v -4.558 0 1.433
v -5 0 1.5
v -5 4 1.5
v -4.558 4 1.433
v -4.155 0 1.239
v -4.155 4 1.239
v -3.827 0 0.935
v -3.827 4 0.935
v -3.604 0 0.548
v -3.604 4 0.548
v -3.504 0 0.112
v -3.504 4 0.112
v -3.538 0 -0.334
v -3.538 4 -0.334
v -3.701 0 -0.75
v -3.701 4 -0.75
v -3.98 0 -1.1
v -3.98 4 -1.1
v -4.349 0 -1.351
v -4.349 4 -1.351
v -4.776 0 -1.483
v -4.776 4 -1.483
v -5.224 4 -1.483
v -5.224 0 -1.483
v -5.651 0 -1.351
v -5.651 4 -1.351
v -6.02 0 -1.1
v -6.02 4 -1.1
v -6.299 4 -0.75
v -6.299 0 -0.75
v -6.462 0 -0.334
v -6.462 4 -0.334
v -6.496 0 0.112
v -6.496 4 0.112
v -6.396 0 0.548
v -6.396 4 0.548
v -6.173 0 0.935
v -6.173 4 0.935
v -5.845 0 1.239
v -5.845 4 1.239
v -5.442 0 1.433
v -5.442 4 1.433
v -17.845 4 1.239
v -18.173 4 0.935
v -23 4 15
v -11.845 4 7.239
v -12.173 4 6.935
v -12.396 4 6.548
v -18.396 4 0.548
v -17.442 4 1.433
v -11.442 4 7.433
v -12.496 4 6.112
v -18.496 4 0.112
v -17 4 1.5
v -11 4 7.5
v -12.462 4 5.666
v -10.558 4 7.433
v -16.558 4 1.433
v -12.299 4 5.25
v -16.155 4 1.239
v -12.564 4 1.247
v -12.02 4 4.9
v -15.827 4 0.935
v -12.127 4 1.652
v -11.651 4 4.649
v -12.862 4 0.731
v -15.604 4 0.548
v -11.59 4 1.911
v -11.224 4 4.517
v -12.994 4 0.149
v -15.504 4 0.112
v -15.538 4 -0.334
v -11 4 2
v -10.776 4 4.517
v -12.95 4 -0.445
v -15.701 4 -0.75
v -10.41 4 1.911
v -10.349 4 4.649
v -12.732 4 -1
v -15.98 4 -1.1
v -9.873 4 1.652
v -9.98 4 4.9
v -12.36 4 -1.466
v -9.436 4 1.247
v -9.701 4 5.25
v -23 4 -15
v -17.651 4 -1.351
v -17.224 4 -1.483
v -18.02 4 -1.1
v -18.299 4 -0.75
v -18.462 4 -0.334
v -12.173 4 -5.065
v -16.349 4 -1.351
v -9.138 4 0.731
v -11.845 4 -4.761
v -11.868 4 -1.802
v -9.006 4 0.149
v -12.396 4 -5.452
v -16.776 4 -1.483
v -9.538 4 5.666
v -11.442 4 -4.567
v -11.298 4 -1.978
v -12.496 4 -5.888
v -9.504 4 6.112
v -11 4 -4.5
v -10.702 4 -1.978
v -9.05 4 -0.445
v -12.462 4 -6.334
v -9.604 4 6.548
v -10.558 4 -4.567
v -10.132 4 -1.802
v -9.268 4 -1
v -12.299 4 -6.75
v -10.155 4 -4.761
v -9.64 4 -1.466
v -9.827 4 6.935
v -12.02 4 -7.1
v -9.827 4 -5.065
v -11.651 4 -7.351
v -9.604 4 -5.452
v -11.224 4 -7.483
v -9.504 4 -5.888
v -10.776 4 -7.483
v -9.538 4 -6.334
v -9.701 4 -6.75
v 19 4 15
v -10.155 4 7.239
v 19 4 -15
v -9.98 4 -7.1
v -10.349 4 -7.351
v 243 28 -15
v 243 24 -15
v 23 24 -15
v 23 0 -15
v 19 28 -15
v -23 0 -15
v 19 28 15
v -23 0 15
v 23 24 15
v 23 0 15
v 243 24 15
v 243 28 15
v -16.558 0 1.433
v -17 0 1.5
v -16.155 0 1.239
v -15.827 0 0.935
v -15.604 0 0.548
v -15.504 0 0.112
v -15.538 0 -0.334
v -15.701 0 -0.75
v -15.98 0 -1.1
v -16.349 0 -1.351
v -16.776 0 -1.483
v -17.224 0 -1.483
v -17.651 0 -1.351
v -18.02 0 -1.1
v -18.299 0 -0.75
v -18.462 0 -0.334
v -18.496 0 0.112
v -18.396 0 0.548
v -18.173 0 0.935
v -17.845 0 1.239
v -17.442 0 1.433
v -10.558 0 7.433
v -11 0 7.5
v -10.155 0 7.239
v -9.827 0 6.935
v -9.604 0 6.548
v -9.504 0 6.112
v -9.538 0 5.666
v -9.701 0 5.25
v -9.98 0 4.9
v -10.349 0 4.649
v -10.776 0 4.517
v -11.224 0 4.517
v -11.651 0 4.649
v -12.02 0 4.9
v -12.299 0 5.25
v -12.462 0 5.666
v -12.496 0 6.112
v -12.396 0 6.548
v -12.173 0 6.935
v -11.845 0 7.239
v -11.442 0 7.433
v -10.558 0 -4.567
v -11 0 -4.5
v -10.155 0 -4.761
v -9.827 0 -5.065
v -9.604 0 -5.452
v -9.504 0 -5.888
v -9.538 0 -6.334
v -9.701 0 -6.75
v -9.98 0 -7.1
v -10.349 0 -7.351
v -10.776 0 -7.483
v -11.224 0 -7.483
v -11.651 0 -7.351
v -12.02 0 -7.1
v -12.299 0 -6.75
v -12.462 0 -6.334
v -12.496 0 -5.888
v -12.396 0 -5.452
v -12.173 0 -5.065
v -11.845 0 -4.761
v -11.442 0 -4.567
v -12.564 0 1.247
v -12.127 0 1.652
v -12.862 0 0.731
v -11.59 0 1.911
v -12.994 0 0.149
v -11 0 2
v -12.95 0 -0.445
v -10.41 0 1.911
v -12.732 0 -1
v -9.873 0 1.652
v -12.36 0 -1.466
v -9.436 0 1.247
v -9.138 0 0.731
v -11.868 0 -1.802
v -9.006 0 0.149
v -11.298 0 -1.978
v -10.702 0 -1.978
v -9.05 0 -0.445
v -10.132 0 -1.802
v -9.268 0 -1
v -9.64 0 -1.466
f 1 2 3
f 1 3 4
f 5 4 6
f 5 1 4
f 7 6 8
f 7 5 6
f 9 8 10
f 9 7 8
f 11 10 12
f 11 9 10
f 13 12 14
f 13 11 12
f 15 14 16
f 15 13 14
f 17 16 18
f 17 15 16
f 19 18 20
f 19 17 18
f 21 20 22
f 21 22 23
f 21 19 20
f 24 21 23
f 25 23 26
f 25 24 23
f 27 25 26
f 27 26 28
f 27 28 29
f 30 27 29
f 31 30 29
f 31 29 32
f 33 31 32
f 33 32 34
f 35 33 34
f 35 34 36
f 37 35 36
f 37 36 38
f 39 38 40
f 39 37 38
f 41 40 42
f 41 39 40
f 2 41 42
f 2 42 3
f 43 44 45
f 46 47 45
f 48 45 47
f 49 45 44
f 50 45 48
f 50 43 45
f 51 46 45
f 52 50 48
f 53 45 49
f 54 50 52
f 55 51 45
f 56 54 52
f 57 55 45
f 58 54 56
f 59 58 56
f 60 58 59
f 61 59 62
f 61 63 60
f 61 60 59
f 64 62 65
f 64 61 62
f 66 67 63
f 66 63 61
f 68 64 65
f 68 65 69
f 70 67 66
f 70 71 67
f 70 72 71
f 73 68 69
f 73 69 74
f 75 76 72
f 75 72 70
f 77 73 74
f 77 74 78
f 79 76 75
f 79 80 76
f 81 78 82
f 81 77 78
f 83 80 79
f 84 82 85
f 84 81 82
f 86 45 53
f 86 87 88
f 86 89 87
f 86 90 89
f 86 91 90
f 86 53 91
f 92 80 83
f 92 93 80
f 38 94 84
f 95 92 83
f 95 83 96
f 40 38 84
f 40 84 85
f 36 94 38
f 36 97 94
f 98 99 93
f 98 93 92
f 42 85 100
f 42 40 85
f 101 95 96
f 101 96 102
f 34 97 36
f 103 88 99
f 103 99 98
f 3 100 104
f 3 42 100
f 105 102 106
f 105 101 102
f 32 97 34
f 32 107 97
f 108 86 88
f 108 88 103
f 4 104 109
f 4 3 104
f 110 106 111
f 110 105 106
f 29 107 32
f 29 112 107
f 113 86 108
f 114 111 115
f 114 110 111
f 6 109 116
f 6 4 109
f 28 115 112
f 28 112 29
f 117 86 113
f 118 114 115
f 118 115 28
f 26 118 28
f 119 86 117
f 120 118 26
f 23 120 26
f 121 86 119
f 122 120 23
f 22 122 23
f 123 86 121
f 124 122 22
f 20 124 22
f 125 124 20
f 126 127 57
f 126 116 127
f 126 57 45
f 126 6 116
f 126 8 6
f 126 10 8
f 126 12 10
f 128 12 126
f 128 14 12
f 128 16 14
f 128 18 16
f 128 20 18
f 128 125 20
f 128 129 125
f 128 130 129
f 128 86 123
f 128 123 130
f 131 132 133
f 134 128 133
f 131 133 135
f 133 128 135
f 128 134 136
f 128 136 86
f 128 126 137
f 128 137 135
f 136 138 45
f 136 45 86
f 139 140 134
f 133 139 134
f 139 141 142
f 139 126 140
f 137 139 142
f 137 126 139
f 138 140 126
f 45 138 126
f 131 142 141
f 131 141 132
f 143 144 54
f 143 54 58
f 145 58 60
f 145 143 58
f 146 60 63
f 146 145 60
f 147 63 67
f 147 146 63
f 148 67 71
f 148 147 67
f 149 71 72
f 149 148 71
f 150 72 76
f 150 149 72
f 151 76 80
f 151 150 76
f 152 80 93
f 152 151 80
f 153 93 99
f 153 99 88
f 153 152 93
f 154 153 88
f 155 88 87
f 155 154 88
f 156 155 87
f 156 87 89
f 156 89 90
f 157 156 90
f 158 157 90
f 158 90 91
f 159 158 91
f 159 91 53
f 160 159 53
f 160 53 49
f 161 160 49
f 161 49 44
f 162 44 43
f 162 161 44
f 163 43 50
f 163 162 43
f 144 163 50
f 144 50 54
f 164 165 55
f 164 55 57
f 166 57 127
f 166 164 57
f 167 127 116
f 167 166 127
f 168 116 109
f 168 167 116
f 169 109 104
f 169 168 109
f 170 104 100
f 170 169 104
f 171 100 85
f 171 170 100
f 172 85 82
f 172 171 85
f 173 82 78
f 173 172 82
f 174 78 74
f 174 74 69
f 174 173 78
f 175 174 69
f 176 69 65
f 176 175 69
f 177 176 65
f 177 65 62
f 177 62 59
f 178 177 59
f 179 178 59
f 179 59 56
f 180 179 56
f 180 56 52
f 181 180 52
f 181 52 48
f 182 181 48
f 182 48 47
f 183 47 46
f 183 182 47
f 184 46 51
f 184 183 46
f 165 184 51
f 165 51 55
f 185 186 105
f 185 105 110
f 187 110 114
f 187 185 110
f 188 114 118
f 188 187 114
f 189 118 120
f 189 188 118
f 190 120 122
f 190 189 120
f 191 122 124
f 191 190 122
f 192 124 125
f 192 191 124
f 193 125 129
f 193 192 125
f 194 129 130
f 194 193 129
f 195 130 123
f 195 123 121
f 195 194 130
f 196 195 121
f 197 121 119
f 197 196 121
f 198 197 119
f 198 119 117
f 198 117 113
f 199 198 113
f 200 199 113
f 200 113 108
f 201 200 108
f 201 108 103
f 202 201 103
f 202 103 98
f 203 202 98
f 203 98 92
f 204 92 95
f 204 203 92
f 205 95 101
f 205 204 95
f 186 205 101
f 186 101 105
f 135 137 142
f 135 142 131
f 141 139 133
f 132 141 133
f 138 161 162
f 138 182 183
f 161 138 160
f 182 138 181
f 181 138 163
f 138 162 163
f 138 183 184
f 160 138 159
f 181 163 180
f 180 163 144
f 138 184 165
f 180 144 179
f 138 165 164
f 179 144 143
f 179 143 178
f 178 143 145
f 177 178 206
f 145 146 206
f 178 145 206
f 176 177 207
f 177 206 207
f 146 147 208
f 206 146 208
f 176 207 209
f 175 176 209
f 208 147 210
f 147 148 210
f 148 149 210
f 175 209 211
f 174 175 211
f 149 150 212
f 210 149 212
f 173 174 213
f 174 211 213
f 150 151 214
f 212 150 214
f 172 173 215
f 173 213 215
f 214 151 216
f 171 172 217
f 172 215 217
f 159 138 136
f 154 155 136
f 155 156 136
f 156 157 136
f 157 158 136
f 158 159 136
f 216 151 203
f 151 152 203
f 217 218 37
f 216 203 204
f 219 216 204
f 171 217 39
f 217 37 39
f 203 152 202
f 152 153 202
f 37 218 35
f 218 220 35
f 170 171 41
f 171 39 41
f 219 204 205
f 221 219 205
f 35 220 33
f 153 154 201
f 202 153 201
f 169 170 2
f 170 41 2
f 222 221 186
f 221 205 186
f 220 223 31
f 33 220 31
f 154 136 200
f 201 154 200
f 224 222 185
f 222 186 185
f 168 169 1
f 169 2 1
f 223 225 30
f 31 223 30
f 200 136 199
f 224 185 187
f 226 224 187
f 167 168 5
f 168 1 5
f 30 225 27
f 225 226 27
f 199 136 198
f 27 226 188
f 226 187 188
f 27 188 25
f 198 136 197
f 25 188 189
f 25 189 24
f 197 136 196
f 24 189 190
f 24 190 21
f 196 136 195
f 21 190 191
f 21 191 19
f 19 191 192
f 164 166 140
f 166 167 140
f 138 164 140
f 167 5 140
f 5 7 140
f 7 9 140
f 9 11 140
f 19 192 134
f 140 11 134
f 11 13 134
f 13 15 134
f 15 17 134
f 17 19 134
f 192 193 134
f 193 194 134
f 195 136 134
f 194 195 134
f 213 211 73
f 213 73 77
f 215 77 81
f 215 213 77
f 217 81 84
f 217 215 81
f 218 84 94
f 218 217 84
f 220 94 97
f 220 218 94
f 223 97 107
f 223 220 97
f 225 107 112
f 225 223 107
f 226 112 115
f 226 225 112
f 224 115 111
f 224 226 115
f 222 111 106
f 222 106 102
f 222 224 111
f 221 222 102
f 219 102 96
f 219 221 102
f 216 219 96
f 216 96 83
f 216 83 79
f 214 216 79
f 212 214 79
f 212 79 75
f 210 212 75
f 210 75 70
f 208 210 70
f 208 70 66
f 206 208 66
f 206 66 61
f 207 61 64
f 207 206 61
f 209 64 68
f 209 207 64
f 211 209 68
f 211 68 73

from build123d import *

# Parameters (mm, degrees)
SKETCH1_W           = 46
SKETCH1_H           = 30
SKETCH1_R           = 1.5
SKETCH1_R_2         = 2
BOSS_EXTRUDE1_DEPTH = 4
SKETCH2_W           = 4
SKETCH2_H           = 30
BOSS_EXTRUDE2_DEPTH = 24
SKETCH3_W           = 30
SKETCH3_H           = 4
BOSS_EXTRUDE3_DEPTH = 220


with BuildPart() as part:
    # Sketch1 → Boss-Extrude1 (new body)
    with BuildSketch(Plane(origin=(0, 0, 0), x_dir=(1, 0, 0), z_dir=(0, 1, 0))):
        Rectangle(SKETCH1_W, SKETCH1_H)
        with Locations(Location((-17, 0, 0), (0, 0, 270))):
            Circle(SKETCH1_R, mode=Mode.SUBTRACT)
        with Locations(Location((-11, 6, 0), (0, 0, 270))):
            Circle(SKETCH1_R, mode=Mode.SUBTRACT)
        with Locations(Location((-5, 0, 0), (0, 0, 270))):
            Circle(SKETCH1_R, mode=Mode.SUBTRACT)
        with Locations(Location((-11, -6, 0), (0, 0, 270))):
            Circle(SKETCH1_R, mode=Mode.SUBTRACT)
        with Locations(Location((-11, 0, 0), (0, 0, 270))):
            Circle(SKETCH1_R_2, mode=Mode.SUBTRACT)
    extrude(amount=BOSS_EXTRUDE1_DEPTH)

    # Sketch2 → Boss-Extrude2 (add)
    with BuildSketch(Plane(origin=(0, 4, 0), x_dir=(1, 0, 0), z_dir=(0, 1, 0))):
        with Locations((21, 0)):
            Rectangle(SKETCH2_W, SKETCH2_H)
    extrude(amount=BOSS_EXTRUDE2_DEPTH)

    # Sketch3 → Boss-Extrude3 (add)
    with BuildSketch(Plane(origin=(23, 0, 0), x_dir=(0, 0, -1), z_dir=(1, 0, 0))):
        with Locations((0, 26)):
            Rectangle(SKETCH3_W, SKETCH3_H)
    extrude(amount=BOSS_EXTRUDE3_DEPTH)


solid = part.part
